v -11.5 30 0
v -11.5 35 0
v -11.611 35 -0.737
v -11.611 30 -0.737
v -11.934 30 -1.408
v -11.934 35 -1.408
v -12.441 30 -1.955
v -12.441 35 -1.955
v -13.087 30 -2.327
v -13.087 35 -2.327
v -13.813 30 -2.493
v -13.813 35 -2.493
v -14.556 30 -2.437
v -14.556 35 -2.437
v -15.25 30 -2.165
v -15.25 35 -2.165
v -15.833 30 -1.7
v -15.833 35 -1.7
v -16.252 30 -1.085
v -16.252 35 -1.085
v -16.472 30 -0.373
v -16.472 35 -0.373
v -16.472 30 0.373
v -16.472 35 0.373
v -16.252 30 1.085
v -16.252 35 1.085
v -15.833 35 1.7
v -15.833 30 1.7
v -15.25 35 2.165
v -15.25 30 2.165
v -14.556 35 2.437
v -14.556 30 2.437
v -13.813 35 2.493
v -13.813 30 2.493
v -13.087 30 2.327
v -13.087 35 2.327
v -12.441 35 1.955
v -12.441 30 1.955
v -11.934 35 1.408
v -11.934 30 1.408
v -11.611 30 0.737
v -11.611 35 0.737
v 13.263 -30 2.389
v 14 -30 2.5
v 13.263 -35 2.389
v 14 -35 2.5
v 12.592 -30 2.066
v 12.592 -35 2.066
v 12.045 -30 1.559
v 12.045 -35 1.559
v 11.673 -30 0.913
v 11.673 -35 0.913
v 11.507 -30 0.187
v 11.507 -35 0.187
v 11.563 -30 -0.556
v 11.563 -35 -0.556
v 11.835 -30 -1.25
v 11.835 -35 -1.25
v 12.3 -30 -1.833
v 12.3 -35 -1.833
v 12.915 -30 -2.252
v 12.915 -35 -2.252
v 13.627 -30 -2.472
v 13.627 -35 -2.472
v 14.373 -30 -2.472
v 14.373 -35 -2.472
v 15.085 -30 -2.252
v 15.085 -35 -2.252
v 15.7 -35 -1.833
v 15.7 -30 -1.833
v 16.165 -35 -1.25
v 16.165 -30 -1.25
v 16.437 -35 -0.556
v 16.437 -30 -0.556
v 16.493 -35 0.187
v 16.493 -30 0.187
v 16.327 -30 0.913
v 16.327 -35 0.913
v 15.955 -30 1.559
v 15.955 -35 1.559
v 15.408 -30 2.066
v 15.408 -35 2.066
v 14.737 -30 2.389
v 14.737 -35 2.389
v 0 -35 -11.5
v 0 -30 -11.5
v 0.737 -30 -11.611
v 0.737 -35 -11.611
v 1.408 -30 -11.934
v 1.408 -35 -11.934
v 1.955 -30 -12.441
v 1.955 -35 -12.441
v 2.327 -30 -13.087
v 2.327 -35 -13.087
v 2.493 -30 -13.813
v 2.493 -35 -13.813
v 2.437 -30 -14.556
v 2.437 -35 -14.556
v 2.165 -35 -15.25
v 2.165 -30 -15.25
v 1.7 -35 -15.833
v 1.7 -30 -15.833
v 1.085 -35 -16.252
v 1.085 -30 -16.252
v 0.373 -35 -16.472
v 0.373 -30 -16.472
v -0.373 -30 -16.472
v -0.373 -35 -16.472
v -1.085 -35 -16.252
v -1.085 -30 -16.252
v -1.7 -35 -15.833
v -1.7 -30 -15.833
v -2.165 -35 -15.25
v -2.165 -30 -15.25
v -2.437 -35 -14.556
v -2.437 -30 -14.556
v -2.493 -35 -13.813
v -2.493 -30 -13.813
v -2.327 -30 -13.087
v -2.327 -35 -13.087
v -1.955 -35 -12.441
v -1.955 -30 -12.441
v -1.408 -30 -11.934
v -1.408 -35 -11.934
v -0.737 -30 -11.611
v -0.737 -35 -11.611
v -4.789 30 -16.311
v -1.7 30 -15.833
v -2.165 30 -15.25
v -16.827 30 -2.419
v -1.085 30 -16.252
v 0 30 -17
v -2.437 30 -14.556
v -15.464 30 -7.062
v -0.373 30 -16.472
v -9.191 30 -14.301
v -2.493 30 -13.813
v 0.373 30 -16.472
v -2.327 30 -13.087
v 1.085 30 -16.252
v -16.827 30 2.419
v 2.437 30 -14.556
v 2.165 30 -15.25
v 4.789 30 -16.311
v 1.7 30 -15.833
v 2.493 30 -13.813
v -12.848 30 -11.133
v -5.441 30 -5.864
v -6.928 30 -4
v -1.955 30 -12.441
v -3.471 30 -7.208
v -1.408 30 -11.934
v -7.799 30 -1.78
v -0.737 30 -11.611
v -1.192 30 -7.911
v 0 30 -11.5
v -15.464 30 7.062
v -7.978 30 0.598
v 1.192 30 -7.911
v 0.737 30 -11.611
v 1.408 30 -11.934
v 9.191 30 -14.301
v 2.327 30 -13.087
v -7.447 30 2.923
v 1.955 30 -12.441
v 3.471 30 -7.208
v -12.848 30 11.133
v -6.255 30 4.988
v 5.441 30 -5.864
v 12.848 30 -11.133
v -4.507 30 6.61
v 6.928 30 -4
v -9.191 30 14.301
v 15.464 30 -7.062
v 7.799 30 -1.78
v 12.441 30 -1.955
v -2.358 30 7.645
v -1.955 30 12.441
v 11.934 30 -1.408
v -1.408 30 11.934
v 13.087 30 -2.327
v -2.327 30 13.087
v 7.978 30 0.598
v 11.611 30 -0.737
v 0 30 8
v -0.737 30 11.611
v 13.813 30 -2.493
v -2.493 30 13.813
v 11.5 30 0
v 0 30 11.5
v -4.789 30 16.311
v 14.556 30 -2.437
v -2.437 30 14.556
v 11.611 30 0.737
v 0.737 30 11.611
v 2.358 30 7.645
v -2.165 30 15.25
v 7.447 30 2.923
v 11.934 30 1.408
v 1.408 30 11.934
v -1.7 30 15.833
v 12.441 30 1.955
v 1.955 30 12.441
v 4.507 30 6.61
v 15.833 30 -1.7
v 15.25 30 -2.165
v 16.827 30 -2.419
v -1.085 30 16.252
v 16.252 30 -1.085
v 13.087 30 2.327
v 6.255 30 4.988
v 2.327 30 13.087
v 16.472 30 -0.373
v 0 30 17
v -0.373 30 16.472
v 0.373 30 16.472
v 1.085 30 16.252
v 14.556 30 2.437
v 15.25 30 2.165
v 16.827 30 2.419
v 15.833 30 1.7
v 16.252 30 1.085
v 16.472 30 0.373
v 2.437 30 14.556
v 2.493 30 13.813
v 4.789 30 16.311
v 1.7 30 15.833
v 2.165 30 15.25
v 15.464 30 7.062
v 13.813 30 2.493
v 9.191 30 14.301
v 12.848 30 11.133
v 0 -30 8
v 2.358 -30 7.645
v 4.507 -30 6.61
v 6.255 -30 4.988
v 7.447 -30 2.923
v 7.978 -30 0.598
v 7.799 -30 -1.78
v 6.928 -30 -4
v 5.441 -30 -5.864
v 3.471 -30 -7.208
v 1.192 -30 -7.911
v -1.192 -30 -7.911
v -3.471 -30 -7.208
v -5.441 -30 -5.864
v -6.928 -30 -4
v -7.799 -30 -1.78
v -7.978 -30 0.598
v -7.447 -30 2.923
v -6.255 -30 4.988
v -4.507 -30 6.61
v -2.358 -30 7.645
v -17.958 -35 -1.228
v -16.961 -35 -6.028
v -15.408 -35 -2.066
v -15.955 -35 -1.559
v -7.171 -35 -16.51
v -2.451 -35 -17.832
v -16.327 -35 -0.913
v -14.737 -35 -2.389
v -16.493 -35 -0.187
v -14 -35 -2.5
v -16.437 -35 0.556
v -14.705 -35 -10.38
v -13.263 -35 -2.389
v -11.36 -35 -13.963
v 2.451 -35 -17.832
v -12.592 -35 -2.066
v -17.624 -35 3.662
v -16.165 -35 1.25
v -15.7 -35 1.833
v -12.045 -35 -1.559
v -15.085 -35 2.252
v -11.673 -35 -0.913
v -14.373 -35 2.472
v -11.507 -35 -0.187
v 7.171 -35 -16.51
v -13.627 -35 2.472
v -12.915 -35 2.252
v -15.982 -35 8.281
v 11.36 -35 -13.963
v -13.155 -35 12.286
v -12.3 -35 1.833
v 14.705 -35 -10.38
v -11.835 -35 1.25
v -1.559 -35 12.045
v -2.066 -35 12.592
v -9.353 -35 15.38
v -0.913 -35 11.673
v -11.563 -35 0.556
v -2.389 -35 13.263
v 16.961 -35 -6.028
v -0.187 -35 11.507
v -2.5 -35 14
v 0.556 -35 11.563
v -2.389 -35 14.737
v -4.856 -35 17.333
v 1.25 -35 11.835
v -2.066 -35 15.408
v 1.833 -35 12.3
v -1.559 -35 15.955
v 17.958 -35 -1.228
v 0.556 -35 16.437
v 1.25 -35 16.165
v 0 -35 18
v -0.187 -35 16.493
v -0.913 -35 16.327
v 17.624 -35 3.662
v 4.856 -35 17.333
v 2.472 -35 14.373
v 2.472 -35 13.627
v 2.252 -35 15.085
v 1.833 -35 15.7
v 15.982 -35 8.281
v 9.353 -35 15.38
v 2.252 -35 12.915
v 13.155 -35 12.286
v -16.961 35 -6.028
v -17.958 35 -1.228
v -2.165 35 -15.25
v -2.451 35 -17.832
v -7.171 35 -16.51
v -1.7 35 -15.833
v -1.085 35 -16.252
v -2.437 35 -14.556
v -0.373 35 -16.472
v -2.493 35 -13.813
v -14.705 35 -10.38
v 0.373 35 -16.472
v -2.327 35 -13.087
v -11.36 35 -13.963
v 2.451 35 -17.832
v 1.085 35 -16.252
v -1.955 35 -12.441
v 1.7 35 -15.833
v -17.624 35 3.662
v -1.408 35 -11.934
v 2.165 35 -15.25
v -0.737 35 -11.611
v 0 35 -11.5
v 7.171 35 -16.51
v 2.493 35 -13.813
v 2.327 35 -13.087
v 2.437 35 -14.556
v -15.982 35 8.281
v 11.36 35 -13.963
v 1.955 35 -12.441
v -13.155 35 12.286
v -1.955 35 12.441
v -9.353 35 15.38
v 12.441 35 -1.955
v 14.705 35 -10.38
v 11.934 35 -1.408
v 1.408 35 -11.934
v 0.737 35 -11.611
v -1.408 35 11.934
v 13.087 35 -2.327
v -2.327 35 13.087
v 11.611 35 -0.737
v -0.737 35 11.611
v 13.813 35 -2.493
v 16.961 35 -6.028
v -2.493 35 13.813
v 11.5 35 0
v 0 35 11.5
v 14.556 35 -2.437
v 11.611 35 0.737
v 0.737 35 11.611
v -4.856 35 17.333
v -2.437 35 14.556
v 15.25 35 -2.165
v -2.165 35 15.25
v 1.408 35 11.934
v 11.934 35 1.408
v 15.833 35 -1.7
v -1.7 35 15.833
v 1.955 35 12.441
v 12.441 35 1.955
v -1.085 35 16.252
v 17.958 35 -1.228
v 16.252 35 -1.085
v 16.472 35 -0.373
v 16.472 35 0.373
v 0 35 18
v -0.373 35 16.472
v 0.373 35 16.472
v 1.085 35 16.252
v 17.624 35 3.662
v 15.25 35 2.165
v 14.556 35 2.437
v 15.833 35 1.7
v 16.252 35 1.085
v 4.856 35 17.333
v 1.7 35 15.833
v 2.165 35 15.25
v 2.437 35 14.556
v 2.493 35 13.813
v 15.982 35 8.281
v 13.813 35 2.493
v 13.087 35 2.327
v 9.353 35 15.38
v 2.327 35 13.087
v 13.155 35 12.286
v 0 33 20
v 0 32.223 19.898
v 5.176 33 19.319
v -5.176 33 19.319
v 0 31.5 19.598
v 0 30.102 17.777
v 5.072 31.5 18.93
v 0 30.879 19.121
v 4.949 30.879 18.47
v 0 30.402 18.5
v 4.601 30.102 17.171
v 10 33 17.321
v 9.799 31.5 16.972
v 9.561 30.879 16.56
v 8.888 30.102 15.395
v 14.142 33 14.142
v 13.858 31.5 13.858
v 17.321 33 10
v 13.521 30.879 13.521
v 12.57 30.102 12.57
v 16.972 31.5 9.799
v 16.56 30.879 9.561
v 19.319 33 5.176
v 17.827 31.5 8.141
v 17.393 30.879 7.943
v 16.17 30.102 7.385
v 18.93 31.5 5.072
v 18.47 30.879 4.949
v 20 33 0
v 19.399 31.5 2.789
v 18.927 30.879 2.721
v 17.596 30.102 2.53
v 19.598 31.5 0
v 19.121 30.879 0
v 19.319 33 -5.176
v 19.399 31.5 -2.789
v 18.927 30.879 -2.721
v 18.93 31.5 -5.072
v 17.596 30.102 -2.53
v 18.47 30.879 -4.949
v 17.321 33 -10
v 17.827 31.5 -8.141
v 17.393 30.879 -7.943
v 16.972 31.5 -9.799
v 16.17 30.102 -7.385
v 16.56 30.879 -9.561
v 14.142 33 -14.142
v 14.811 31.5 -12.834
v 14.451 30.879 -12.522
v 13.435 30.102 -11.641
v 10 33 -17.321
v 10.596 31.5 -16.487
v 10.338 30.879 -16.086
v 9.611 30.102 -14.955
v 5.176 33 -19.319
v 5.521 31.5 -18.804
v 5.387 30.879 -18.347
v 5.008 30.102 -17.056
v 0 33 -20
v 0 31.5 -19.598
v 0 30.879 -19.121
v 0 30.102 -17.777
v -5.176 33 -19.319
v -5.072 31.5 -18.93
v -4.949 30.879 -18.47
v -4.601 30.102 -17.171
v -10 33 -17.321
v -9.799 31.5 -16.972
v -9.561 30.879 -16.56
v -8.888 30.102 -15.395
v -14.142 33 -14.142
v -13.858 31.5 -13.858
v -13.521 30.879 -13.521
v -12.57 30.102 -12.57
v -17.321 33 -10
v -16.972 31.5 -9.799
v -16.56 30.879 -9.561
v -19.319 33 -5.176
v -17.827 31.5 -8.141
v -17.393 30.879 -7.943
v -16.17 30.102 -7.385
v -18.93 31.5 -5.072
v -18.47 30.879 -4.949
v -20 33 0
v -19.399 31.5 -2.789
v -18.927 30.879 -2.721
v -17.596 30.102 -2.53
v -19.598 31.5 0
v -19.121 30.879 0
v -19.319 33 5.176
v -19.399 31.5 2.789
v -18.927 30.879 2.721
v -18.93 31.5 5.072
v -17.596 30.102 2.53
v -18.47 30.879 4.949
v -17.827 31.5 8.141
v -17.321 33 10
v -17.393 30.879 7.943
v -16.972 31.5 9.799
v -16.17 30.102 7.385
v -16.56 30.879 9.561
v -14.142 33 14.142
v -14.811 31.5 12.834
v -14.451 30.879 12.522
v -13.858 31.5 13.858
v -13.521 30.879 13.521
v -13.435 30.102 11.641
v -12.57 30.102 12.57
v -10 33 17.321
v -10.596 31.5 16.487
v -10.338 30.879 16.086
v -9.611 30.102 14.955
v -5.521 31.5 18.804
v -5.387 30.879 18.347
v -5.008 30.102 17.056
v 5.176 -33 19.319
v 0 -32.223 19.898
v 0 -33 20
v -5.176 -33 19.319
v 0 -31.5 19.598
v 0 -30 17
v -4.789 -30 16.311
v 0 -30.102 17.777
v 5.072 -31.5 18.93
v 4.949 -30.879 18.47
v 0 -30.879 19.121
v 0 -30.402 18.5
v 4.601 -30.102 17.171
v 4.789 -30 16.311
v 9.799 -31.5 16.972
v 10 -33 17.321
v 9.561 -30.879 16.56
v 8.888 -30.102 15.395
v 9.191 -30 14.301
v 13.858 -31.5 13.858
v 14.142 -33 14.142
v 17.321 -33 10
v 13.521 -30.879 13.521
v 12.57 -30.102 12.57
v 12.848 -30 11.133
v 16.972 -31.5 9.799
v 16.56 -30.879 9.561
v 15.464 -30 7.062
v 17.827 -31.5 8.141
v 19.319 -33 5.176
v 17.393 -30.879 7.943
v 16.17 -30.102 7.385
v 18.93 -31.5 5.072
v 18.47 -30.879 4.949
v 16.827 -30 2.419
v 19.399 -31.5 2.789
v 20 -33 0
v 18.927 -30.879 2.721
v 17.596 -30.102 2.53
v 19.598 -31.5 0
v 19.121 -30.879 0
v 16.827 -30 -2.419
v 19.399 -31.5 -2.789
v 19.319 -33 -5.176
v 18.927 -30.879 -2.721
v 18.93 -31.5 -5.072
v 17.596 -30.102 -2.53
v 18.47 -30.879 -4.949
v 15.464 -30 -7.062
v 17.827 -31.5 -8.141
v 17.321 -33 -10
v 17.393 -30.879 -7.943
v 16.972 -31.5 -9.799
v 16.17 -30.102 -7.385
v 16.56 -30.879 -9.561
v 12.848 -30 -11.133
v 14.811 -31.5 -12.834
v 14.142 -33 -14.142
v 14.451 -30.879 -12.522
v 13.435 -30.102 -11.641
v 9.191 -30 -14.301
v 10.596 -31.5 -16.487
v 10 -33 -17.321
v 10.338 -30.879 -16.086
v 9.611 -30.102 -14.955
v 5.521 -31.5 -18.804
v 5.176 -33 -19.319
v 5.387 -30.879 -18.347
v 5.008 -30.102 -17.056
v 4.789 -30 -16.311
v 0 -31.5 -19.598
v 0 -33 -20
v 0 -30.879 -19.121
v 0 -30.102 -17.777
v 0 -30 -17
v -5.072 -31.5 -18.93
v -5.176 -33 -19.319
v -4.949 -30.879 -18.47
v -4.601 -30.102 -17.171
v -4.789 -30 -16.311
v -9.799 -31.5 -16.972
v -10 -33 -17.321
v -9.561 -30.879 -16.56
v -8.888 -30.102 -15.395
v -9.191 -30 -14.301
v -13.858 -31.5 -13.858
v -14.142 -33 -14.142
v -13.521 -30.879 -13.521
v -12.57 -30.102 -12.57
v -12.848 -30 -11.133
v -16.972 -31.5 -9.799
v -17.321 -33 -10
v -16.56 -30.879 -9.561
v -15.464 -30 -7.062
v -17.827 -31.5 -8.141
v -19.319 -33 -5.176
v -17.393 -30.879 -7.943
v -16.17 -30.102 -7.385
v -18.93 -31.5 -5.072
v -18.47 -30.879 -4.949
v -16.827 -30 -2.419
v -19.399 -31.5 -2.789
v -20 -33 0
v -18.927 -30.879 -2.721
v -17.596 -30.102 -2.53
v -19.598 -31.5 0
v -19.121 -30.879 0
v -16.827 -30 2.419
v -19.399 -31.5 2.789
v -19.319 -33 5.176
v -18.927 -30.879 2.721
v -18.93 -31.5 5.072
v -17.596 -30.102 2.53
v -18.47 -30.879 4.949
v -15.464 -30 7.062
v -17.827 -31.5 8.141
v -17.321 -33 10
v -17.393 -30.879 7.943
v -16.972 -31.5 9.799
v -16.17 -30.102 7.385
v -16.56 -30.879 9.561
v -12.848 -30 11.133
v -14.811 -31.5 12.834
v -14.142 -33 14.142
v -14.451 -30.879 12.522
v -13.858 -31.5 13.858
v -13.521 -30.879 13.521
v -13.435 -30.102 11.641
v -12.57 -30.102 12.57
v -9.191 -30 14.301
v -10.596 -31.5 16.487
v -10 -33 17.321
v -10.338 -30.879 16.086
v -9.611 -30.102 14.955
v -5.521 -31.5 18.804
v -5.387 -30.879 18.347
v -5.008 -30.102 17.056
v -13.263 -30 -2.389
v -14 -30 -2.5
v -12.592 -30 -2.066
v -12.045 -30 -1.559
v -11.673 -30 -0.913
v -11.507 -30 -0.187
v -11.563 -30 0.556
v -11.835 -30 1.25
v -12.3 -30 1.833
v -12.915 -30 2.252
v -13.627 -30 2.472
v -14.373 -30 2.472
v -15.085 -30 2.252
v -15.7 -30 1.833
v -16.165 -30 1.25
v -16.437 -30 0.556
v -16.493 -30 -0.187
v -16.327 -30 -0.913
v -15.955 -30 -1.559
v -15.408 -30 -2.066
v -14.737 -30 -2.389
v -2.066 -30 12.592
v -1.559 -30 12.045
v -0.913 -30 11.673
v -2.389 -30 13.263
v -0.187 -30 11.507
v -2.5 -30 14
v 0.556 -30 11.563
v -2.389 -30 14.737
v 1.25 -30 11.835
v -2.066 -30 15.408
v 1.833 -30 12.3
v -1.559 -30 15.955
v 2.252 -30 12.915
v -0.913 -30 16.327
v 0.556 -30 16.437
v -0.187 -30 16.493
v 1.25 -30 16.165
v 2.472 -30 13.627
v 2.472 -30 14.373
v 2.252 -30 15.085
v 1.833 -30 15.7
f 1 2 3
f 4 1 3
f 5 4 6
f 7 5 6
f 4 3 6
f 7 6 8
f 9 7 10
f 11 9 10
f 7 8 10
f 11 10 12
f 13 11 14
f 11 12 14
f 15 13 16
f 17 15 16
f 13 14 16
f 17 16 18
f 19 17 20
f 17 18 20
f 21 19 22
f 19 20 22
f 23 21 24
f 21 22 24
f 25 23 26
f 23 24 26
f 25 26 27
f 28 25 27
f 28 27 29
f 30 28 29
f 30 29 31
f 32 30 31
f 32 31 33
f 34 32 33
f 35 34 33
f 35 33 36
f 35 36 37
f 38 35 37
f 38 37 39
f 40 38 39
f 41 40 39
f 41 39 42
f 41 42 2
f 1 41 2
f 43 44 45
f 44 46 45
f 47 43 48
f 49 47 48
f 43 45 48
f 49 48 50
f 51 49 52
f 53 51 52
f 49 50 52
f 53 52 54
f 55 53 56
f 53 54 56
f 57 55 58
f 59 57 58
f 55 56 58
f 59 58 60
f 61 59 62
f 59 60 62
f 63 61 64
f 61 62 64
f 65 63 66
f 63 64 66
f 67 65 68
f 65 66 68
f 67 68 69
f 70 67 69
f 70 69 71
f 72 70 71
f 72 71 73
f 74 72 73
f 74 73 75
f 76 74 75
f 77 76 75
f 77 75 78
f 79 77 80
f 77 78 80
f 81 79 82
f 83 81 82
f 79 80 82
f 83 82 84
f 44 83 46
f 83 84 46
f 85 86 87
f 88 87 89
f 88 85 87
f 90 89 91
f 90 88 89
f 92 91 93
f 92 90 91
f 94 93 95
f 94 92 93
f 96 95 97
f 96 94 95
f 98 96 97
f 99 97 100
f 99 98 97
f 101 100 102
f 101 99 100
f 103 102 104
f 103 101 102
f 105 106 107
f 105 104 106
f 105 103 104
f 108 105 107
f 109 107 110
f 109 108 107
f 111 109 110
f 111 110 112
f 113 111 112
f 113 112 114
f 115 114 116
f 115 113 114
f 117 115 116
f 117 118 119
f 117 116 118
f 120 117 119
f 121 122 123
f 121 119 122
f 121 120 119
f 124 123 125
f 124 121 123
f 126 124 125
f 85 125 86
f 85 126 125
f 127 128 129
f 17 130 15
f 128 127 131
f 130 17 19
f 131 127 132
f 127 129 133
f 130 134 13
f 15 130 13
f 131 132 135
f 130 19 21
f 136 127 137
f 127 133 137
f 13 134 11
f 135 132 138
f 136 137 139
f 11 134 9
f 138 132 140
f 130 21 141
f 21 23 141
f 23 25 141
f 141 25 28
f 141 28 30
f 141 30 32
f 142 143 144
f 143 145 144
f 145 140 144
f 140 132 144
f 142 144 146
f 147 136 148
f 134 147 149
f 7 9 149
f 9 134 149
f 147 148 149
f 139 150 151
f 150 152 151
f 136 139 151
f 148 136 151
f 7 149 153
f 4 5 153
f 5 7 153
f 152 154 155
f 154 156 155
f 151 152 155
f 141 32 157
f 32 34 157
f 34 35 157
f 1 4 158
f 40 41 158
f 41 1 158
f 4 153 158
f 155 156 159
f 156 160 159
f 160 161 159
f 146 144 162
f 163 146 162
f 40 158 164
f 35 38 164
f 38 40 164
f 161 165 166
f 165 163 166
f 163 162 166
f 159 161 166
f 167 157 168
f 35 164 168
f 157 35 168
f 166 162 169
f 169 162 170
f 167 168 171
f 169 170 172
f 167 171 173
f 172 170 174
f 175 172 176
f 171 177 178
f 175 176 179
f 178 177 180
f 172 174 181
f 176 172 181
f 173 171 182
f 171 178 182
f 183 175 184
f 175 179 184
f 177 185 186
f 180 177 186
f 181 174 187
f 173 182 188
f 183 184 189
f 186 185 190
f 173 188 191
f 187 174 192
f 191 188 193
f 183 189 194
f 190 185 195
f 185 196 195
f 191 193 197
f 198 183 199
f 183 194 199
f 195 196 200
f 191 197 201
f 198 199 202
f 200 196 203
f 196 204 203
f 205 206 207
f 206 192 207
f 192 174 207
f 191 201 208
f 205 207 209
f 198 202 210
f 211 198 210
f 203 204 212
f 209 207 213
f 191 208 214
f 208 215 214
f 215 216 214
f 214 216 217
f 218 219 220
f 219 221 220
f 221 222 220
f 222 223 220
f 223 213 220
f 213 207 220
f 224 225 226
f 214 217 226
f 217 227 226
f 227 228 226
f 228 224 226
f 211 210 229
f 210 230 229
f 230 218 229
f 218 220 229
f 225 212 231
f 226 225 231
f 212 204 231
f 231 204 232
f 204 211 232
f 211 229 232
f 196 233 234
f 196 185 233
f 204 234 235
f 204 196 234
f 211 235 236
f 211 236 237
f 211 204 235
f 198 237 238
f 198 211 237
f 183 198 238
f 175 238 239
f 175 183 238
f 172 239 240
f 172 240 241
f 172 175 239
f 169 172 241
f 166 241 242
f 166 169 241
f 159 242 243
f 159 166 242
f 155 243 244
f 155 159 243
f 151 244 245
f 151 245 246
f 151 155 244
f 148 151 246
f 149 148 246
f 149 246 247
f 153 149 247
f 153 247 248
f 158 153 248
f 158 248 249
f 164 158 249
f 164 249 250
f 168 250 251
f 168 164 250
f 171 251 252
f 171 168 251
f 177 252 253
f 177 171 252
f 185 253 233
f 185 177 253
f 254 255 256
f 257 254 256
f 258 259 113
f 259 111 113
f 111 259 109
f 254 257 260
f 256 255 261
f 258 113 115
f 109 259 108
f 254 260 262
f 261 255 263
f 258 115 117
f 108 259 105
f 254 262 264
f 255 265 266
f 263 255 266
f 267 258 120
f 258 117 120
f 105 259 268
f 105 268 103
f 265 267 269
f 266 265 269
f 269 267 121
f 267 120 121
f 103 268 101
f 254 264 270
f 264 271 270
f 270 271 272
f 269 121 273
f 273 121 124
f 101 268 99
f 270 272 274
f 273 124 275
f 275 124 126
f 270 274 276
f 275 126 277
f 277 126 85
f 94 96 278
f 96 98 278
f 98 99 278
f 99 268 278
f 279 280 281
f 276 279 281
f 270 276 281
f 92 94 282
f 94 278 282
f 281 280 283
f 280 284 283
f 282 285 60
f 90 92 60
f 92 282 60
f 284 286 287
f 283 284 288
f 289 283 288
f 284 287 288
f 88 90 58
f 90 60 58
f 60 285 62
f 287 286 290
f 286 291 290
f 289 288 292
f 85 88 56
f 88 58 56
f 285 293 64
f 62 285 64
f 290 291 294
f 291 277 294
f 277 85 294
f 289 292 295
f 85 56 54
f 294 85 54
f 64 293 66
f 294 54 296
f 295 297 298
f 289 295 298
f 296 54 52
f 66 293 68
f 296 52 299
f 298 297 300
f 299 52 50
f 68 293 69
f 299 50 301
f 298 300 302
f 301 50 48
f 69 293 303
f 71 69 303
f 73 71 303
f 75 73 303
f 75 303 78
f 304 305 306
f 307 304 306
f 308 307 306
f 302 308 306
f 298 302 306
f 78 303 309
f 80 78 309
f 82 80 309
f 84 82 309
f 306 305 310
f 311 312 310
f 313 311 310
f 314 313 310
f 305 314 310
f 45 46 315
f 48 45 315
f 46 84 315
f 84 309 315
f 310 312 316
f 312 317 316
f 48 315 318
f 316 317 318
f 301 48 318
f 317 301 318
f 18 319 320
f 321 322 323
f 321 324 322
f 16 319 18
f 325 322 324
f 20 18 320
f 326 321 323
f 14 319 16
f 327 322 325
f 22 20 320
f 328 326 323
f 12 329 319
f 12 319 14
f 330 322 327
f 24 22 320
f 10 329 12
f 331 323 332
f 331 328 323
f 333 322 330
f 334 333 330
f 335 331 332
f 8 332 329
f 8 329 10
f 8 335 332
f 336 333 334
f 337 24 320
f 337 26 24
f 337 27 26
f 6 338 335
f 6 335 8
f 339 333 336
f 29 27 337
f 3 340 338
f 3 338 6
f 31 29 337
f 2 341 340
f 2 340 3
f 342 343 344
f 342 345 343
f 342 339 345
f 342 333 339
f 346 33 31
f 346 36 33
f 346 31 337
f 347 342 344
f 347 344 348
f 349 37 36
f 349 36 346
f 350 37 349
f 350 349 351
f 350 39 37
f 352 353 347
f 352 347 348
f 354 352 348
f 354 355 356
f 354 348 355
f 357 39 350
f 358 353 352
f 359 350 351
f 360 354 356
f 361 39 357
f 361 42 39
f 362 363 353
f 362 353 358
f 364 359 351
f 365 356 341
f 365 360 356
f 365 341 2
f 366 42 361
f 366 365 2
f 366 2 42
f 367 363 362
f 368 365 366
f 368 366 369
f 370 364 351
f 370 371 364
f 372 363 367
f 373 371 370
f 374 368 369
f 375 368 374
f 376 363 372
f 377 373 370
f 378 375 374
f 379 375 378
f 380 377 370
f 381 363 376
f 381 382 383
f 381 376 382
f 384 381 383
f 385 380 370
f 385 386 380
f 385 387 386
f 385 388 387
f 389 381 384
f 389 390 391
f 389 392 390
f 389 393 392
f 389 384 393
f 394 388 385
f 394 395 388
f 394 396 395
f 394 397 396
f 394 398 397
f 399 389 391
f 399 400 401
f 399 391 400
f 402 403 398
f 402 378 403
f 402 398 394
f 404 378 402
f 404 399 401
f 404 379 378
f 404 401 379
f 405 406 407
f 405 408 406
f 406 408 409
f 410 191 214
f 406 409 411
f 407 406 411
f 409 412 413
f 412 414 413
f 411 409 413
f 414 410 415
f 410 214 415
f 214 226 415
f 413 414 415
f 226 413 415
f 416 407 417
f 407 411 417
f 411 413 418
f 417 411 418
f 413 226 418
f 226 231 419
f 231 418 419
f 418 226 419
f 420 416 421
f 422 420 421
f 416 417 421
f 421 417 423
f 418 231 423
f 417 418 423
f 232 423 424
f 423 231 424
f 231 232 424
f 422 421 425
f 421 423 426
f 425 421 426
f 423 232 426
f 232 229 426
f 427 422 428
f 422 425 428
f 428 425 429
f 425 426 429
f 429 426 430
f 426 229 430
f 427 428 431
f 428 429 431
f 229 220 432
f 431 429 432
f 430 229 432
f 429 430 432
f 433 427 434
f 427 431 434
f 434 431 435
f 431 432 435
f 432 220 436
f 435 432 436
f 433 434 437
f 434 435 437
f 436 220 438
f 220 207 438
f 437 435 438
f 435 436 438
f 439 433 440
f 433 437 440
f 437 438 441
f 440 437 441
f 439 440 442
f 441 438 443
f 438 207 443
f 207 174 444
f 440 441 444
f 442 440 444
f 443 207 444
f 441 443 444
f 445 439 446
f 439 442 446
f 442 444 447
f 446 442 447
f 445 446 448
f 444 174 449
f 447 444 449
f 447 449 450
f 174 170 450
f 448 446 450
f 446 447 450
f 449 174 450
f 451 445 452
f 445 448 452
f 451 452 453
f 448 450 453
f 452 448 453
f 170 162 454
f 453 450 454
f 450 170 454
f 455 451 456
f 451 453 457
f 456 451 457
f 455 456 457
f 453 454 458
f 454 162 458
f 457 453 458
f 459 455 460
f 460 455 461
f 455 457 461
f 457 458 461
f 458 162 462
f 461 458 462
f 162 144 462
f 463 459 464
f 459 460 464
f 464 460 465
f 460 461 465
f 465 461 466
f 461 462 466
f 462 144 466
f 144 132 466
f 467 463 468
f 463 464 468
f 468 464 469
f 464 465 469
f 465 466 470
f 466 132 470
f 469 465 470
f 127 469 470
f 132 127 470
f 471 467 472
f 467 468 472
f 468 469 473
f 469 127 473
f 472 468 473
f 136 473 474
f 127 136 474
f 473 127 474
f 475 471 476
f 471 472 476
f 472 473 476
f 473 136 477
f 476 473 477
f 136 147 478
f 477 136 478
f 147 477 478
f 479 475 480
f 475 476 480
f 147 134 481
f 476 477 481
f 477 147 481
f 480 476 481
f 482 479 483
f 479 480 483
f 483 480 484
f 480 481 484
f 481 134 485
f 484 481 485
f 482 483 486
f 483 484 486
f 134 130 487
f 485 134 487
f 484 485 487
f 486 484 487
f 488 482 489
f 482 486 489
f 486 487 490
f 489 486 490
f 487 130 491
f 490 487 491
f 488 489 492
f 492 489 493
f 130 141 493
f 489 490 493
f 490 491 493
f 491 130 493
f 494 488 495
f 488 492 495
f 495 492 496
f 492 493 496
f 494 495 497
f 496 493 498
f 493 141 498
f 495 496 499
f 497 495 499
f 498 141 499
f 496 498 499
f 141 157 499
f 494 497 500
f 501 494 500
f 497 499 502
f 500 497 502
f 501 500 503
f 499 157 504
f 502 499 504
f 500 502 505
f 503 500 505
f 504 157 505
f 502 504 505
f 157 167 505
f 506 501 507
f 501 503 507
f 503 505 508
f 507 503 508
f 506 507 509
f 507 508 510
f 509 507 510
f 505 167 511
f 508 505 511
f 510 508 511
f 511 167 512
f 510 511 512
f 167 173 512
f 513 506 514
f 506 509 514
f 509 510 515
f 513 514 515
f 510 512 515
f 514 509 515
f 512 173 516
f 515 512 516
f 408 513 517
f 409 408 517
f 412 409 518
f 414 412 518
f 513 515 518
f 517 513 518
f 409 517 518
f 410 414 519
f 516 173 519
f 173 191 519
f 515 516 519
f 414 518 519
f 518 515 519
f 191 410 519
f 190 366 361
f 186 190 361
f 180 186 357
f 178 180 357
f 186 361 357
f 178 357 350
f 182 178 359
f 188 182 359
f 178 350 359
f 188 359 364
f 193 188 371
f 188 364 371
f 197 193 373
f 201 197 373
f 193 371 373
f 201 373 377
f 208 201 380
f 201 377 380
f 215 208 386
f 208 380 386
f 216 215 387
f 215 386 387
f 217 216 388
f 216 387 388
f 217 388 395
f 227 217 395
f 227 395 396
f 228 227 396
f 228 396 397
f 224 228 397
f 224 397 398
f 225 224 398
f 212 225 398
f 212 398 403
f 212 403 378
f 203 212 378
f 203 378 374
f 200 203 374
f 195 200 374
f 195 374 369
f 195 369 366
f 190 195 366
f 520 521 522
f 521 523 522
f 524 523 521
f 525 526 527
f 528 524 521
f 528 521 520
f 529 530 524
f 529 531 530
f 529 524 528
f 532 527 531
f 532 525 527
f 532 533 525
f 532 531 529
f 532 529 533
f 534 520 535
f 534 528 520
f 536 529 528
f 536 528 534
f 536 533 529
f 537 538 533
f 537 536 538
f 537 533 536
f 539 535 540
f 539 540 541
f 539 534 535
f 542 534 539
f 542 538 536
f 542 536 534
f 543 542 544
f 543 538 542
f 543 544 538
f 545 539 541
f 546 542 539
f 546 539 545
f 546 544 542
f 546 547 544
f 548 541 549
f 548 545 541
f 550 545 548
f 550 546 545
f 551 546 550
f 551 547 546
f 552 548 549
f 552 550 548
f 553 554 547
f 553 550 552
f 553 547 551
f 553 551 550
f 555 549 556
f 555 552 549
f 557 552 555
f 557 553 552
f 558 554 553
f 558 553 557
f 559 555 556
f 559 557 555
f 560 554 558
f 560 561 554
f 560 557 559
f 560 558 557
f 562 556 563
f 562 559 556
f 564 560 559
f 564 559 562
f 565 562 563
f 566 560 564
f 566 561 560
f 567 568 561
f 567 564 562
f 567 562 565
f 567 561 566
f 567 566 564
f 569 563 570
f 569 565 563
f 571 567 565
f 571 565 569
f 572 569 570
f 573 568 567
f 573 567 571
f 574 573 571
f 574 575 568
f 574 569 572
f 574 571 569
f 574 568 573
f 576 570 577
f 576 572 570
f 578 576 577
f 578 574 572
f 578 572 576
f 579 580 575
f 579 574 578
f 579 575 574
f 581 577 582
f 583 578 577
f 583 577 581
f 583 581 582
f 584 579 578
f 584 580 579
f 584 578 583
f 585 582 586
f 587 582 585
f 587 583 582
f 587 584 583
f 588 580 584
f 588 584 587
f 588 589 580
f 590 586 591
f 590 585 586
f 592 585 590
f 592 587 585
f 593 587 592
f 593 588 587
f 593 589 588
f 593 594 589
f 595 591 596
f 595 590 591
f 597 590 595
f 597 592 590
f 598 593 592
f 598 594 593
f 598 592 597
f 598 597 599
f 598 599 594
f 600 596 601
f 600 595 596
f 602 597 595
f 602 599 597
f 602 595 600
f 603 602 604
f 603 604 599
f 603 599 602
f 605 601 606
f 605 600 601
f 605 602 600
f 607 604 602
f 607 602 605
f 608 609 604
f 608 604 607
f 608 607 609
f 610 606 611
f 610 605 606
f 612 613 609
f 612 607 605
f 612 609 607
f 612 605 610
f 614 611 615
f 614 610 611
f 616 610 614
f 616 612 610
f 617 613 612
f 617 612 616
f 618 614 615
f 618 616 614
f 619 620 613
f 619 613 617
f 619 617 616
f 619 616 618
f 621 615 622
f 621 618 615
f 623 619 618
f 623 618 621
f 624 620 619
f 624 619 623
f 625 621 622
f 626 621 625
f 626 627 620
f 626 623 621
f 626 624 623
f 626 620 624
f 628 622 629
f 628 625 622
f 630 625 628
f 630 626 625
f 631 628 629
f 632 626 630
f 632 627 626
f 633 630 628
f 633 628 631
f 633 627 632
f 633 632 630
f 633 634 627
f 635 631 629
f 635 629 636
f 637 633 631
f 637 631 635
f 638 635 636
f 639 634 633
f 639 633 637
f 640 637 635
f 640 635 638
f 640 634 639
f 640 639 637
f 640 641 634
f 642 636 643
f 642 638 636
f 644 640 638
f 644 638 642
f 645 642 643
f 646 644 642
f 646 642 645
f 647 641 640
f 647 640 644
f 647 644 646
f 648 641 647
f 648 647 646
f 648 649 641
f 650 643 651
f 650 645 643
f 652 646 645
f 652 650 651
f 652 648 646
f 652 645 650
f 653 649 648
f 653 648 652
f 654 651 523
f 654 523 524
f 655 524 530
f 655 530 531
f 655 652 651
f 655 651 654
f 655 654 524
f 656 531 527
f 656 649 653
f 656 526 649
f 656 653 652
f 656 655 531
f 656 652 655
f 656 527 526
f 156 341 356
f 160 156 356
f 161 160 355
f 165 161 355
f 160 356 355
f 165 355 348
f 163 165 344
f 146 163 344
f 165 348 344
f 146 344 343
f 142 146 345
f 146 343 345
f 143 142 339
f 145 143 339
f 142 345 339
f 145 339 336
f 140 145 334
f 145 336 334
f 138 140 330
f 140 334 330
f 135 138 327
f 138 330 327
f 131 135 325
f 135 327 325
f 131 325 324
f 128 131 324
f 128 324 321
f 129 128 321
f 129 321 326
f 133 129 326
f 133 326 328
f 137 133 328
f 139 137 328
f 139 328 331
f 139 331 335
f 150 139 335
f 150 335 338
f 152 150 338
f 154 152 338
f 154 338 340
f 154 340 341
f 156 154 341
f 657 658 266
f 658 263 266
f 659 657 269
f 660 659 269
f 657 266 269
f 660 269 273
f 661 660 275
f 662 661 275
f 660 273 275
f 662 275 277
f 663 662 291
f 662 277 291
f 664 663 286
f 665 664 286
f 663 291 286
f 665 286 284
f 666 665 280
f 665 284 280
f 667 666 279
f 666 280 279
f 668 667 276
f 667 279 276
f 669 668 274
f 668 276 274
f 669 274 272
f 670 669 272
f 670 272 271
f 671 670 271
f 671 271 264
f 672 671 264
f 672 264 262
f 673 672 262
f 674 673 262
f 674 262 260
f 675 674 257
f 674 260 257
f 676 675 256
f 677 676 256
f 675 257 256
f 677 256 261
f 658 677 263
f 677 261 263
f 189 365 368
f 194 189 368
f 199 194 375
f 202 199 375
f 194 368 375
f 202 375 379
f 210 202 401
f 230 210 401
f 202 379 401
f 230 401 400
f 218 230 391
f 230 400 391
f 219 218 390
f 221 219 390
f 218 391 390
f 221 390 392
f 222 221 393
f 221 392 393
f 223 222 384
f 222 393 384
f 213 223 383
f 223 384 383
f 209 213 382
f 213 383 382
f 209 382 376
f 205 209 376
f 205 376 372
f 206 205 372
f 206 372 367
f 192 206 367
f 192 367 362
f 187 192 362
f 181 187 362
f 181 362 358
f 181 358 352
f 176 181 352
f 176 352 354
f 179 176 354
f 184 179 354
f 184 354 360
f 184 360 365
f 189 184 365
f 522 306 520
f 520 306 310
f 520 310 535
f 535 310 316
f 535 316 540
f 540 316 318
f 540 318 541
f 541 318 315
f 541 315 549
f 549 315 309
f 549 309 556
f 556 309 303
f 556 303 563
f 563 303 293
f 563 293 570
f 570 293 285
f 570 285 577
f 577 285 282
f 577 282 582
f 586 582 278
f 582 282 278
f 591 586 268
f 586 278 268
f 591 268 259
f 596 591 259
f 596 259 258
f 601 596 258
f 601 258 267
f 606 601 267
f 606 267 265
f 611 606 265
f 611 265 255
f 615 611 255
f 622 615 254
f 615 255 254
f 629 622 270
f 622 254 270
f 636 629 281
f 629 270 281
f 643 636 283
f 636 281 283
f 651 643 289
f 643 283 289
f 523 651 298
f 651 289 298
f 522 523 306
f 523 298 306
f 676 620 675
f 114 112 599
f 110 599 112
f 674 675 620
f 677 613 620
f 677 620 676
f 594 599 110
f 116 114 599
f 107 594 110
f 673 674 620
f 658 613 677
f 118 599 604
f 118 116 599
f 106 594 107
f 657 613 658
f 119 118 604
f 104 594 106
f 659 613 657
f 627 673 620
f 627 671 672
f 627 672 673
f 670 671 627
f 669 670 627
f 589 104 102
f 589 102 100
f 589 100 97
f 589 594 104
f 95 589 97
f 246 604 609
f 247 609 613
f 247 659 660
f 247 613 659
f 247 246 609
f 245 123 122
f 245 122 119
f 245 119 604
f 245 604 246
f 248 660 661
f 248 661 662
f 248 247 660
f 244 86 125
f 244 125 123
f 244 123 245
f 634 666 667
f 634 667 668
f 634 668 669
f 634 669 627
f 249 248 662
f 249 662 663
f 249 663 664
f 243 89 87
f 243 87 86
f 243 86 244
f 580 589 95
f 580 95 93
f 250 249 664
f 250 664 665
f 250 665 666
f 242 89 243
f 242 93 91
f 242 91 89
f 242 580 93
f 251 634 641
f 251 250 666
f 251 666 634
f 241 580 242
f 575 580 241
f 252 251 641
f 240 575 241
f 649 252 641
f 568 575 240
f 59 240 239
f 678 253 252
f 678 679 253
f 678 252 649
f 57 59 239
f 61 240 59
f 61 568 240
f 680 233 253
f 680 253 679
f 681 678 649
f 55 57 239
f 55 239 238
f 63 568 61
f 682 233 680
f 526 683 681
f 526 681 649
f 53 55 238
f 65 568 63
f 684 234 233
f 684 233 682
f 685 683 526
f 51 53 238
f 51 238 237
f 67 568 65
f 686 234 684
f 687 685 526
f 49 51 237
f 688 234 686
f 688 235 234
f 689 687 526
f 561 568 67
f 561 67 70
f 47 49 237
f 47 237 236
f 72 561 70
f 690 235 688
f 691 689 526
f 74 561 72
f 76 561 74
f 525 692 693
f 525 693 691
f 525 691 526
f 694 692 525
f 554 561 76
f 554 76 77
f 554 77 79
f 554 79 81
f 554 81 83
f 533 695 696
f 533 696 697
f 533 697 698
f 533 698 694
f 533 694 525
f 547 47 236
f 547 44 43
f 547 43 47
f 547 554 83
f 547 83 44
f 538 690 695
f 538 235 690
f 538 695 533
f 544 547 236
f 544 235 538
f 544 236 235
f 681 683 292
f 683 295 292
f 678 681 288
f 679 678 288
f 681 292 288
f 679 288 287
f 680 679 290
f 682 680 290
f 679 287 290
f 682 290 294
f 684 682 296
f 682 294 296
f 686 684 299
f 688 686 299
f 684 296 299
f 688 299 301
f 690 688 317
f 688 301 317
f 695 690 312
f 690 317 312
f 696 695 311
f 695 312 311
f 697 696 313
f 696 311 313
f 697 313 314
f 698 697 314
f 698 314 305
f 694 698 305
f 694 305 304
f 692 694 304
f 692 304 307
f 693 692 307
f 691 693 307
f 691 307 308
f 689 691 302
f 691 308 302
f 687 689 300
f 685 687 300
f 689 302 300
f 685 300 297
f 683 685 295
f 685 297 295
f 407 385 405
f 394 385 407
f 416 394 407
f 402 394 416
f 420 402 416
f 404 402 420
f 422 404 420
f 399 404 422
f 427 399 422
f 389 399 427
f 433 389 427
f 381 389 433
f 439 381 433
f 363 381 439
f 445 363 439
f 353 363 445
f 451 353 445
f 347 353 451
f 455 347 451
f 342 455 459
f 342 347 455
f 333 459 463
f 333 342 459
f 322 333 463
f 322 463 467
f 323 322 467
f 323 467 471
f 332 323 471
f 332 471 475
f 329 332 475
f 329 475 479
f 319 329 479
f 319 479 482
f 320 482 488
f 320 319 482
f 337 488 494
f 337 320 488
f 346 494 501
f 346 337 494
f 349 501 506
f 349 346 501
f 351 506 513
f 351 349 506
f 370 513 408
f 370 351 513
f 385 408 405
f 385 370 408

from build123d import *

# Parameters (mm, degrees)
SKETCH1_R                = 8
BOSS_EXTRUDE1_DEPTH      = 30
SKETCH3_R                = 20
BOSS_EXTRUDE2_DEPTH      = 5
CHAMFER1_SIZE            = 2
SKETCH4_R                = 2.5
CUT_EXTRUDE1_DEPTH       = 71.887234394
CIRPATTERN1_COUNT        = 4
FILLET1_R                = 3
MIRROR1_COPY_1_SKETCH_R  = 2.5
MIRROR1_COPY_1_DEPTH     = 71.887234394
MIRROR1_COPY_2_SKETCH_R  = 2.5
MIRROR1_COPY_2_DEPTH     = 71.887234394
MIRROR1_COPY_3_SKETCH_R  = 2.5
MIRROR1_COPY_3_DEPTH     = 71.887234394
CHAMFER1_OF_MIRROR1_SIZE = 2
FILLET1_OF_MIRROR1_R     = 3


with BuildPart() as part:
    # Sketch1 → Boss-Extrude1 (new, symmetric)
    with BuildSketch(Plane(origin=(0, 0, 0), x_dir=(1, 0, 0), z_dir=(0, 1, 0))):
        with Locations(Location((0, 0, 0), (0, 0, 270))):
            Circle(SKETCH1_R)
    extrude(amount=BOSS_EXTRUDE1_DEPTH, both=True)

    # Sketch3 → Boss-Extrude2 (add)
    with BuildSketch(Plane(origin=(0, 30, 0), x_dir=(1, 0, 0), z_dir=(0, 1, 0))):
        with Locations(Location((0, 0, 0), (0, 0, 270))):
            Circle(SKETCH3_R)
    boss_extrude2 = extrude(amount=BOSS_EXTRUDE2_DEPTH)

    # Chamfer1
    chamfer1_edges = [part.edges().sort_by_distance(p)[0] for p in [
        (0, 35, -20),
    ]]
    chamfer(chamfer1_edges, length=CHAMFER1_SIZE)

    # Sketch4 → Cut-Extrude1 (cut, through all)
    with BuildSketch(Plane(origin=(0, 35, 0), x_dir=(1, 0, 0), z_dir=(0, 1, 0))):
        with Locations(Location((0, 14, 0), (0, 0, 270))):
            Circle(SKETCH4_R)
    cut_extrude1 = extrude(amount=-CUT_EXTRUDE1_DEPTH, mode=Mode.SUBTRACT)

    # CirPattern1: Cut-Extrude1 ×4 about axis
    cirpattern1_axis = Axis((0, 0, 0), (0, 1, 0))
    for i in range(1, CIRPATTERN1_COUNT):
        add(cut_extrude1.rotate(cirpattern1_axis, i * 360 / CIRPATTERN1_COUNT), mode=Mode.SUBTRACT)

    # Fillet1
    fillet1_edges = [part.edges().sort_by_distance(p)[0] for p in [
        (0, 30, -20),
    ]]
    fillet(fillet1_edges, radius=FILLET1_R - 0.0001)  # a hair under: the kernel refuses the full size

    # Mirror1: Boss-Extrude2, Cut-Extrude1 across plane
    add(boss_extrude2.mirror(Plane.ZX))
    add(cut_extrude1.mirror(Plane.ZX), mode=Mode.SUBTRACT)

    # Mirror1 copy 1 sketch → Mirror1 copy 1 (cut, through all)
    with BuildSketch(Plane(origin=(0, -35, 0), x_dir=(0, 0, -1), z_dir=(0, -1, 0))):
        with Locations((0, -14)):
            Circle(MIRROR1_COPY_1_SKETCH_R)
    extrude(amount=-MIRROR1_COPY_1_DEPTH, mode=Mode.SUBTRACT)

    # Mirror1 copy 2 sketch → Mirror1 copy 2 (cut, through all)
    with BuildSketch(Plane(origin=(0, -35, 0), x_dir=(-1, 0, 0), z_dir=(0, -1, 0))):
        with Locations((0, -14)):
            Circle(MIRROR1_COPY_2_SKETCH_R)
    extrude(amount=-MIRROR1_COPY_2_DEPTH, mode=Mode.SUBTRACT)

    # Mirror1 copy 3 sketch → Mirror1 copy 3 (cut, through all)
    with BuildSketch(Plane(origin=(0, -35, 0), x_dir=(0, 0, 1), z_dir=(0, -1, 0))):
        with Locations((0, -14)):
            Circle(MIRROR1_COPY_3_SKETCH_R)
    extrude(amount=-MIRROR1_COPY_3_DEPTH, mode=Mode.SUBTRACT)

    # Chamfer1 of Mirror1
    chamfer1_of_mirror1_edges = [part.edges().sort_by_distance(p)[0] for p in [
        (0, -35, -20),
    ]]
    chamfer(chamfer1_of_mirror1_edges, length=CHAMFER1_OF_MIRROR1_SIZE)

    # Fillet1 of Mirror1
    fillet1_of_mirror1_edges = [part.edges().sort_by_distance(p)[0] for p in [
        (0, -30, -20),
    ]]
    fillet(fillet1_of_mirror1_edges, radius=FILLET1_OF_MIRROR1_R - 0.0001)  # a hair under: the kernel refuses the full size


solid = part.part
